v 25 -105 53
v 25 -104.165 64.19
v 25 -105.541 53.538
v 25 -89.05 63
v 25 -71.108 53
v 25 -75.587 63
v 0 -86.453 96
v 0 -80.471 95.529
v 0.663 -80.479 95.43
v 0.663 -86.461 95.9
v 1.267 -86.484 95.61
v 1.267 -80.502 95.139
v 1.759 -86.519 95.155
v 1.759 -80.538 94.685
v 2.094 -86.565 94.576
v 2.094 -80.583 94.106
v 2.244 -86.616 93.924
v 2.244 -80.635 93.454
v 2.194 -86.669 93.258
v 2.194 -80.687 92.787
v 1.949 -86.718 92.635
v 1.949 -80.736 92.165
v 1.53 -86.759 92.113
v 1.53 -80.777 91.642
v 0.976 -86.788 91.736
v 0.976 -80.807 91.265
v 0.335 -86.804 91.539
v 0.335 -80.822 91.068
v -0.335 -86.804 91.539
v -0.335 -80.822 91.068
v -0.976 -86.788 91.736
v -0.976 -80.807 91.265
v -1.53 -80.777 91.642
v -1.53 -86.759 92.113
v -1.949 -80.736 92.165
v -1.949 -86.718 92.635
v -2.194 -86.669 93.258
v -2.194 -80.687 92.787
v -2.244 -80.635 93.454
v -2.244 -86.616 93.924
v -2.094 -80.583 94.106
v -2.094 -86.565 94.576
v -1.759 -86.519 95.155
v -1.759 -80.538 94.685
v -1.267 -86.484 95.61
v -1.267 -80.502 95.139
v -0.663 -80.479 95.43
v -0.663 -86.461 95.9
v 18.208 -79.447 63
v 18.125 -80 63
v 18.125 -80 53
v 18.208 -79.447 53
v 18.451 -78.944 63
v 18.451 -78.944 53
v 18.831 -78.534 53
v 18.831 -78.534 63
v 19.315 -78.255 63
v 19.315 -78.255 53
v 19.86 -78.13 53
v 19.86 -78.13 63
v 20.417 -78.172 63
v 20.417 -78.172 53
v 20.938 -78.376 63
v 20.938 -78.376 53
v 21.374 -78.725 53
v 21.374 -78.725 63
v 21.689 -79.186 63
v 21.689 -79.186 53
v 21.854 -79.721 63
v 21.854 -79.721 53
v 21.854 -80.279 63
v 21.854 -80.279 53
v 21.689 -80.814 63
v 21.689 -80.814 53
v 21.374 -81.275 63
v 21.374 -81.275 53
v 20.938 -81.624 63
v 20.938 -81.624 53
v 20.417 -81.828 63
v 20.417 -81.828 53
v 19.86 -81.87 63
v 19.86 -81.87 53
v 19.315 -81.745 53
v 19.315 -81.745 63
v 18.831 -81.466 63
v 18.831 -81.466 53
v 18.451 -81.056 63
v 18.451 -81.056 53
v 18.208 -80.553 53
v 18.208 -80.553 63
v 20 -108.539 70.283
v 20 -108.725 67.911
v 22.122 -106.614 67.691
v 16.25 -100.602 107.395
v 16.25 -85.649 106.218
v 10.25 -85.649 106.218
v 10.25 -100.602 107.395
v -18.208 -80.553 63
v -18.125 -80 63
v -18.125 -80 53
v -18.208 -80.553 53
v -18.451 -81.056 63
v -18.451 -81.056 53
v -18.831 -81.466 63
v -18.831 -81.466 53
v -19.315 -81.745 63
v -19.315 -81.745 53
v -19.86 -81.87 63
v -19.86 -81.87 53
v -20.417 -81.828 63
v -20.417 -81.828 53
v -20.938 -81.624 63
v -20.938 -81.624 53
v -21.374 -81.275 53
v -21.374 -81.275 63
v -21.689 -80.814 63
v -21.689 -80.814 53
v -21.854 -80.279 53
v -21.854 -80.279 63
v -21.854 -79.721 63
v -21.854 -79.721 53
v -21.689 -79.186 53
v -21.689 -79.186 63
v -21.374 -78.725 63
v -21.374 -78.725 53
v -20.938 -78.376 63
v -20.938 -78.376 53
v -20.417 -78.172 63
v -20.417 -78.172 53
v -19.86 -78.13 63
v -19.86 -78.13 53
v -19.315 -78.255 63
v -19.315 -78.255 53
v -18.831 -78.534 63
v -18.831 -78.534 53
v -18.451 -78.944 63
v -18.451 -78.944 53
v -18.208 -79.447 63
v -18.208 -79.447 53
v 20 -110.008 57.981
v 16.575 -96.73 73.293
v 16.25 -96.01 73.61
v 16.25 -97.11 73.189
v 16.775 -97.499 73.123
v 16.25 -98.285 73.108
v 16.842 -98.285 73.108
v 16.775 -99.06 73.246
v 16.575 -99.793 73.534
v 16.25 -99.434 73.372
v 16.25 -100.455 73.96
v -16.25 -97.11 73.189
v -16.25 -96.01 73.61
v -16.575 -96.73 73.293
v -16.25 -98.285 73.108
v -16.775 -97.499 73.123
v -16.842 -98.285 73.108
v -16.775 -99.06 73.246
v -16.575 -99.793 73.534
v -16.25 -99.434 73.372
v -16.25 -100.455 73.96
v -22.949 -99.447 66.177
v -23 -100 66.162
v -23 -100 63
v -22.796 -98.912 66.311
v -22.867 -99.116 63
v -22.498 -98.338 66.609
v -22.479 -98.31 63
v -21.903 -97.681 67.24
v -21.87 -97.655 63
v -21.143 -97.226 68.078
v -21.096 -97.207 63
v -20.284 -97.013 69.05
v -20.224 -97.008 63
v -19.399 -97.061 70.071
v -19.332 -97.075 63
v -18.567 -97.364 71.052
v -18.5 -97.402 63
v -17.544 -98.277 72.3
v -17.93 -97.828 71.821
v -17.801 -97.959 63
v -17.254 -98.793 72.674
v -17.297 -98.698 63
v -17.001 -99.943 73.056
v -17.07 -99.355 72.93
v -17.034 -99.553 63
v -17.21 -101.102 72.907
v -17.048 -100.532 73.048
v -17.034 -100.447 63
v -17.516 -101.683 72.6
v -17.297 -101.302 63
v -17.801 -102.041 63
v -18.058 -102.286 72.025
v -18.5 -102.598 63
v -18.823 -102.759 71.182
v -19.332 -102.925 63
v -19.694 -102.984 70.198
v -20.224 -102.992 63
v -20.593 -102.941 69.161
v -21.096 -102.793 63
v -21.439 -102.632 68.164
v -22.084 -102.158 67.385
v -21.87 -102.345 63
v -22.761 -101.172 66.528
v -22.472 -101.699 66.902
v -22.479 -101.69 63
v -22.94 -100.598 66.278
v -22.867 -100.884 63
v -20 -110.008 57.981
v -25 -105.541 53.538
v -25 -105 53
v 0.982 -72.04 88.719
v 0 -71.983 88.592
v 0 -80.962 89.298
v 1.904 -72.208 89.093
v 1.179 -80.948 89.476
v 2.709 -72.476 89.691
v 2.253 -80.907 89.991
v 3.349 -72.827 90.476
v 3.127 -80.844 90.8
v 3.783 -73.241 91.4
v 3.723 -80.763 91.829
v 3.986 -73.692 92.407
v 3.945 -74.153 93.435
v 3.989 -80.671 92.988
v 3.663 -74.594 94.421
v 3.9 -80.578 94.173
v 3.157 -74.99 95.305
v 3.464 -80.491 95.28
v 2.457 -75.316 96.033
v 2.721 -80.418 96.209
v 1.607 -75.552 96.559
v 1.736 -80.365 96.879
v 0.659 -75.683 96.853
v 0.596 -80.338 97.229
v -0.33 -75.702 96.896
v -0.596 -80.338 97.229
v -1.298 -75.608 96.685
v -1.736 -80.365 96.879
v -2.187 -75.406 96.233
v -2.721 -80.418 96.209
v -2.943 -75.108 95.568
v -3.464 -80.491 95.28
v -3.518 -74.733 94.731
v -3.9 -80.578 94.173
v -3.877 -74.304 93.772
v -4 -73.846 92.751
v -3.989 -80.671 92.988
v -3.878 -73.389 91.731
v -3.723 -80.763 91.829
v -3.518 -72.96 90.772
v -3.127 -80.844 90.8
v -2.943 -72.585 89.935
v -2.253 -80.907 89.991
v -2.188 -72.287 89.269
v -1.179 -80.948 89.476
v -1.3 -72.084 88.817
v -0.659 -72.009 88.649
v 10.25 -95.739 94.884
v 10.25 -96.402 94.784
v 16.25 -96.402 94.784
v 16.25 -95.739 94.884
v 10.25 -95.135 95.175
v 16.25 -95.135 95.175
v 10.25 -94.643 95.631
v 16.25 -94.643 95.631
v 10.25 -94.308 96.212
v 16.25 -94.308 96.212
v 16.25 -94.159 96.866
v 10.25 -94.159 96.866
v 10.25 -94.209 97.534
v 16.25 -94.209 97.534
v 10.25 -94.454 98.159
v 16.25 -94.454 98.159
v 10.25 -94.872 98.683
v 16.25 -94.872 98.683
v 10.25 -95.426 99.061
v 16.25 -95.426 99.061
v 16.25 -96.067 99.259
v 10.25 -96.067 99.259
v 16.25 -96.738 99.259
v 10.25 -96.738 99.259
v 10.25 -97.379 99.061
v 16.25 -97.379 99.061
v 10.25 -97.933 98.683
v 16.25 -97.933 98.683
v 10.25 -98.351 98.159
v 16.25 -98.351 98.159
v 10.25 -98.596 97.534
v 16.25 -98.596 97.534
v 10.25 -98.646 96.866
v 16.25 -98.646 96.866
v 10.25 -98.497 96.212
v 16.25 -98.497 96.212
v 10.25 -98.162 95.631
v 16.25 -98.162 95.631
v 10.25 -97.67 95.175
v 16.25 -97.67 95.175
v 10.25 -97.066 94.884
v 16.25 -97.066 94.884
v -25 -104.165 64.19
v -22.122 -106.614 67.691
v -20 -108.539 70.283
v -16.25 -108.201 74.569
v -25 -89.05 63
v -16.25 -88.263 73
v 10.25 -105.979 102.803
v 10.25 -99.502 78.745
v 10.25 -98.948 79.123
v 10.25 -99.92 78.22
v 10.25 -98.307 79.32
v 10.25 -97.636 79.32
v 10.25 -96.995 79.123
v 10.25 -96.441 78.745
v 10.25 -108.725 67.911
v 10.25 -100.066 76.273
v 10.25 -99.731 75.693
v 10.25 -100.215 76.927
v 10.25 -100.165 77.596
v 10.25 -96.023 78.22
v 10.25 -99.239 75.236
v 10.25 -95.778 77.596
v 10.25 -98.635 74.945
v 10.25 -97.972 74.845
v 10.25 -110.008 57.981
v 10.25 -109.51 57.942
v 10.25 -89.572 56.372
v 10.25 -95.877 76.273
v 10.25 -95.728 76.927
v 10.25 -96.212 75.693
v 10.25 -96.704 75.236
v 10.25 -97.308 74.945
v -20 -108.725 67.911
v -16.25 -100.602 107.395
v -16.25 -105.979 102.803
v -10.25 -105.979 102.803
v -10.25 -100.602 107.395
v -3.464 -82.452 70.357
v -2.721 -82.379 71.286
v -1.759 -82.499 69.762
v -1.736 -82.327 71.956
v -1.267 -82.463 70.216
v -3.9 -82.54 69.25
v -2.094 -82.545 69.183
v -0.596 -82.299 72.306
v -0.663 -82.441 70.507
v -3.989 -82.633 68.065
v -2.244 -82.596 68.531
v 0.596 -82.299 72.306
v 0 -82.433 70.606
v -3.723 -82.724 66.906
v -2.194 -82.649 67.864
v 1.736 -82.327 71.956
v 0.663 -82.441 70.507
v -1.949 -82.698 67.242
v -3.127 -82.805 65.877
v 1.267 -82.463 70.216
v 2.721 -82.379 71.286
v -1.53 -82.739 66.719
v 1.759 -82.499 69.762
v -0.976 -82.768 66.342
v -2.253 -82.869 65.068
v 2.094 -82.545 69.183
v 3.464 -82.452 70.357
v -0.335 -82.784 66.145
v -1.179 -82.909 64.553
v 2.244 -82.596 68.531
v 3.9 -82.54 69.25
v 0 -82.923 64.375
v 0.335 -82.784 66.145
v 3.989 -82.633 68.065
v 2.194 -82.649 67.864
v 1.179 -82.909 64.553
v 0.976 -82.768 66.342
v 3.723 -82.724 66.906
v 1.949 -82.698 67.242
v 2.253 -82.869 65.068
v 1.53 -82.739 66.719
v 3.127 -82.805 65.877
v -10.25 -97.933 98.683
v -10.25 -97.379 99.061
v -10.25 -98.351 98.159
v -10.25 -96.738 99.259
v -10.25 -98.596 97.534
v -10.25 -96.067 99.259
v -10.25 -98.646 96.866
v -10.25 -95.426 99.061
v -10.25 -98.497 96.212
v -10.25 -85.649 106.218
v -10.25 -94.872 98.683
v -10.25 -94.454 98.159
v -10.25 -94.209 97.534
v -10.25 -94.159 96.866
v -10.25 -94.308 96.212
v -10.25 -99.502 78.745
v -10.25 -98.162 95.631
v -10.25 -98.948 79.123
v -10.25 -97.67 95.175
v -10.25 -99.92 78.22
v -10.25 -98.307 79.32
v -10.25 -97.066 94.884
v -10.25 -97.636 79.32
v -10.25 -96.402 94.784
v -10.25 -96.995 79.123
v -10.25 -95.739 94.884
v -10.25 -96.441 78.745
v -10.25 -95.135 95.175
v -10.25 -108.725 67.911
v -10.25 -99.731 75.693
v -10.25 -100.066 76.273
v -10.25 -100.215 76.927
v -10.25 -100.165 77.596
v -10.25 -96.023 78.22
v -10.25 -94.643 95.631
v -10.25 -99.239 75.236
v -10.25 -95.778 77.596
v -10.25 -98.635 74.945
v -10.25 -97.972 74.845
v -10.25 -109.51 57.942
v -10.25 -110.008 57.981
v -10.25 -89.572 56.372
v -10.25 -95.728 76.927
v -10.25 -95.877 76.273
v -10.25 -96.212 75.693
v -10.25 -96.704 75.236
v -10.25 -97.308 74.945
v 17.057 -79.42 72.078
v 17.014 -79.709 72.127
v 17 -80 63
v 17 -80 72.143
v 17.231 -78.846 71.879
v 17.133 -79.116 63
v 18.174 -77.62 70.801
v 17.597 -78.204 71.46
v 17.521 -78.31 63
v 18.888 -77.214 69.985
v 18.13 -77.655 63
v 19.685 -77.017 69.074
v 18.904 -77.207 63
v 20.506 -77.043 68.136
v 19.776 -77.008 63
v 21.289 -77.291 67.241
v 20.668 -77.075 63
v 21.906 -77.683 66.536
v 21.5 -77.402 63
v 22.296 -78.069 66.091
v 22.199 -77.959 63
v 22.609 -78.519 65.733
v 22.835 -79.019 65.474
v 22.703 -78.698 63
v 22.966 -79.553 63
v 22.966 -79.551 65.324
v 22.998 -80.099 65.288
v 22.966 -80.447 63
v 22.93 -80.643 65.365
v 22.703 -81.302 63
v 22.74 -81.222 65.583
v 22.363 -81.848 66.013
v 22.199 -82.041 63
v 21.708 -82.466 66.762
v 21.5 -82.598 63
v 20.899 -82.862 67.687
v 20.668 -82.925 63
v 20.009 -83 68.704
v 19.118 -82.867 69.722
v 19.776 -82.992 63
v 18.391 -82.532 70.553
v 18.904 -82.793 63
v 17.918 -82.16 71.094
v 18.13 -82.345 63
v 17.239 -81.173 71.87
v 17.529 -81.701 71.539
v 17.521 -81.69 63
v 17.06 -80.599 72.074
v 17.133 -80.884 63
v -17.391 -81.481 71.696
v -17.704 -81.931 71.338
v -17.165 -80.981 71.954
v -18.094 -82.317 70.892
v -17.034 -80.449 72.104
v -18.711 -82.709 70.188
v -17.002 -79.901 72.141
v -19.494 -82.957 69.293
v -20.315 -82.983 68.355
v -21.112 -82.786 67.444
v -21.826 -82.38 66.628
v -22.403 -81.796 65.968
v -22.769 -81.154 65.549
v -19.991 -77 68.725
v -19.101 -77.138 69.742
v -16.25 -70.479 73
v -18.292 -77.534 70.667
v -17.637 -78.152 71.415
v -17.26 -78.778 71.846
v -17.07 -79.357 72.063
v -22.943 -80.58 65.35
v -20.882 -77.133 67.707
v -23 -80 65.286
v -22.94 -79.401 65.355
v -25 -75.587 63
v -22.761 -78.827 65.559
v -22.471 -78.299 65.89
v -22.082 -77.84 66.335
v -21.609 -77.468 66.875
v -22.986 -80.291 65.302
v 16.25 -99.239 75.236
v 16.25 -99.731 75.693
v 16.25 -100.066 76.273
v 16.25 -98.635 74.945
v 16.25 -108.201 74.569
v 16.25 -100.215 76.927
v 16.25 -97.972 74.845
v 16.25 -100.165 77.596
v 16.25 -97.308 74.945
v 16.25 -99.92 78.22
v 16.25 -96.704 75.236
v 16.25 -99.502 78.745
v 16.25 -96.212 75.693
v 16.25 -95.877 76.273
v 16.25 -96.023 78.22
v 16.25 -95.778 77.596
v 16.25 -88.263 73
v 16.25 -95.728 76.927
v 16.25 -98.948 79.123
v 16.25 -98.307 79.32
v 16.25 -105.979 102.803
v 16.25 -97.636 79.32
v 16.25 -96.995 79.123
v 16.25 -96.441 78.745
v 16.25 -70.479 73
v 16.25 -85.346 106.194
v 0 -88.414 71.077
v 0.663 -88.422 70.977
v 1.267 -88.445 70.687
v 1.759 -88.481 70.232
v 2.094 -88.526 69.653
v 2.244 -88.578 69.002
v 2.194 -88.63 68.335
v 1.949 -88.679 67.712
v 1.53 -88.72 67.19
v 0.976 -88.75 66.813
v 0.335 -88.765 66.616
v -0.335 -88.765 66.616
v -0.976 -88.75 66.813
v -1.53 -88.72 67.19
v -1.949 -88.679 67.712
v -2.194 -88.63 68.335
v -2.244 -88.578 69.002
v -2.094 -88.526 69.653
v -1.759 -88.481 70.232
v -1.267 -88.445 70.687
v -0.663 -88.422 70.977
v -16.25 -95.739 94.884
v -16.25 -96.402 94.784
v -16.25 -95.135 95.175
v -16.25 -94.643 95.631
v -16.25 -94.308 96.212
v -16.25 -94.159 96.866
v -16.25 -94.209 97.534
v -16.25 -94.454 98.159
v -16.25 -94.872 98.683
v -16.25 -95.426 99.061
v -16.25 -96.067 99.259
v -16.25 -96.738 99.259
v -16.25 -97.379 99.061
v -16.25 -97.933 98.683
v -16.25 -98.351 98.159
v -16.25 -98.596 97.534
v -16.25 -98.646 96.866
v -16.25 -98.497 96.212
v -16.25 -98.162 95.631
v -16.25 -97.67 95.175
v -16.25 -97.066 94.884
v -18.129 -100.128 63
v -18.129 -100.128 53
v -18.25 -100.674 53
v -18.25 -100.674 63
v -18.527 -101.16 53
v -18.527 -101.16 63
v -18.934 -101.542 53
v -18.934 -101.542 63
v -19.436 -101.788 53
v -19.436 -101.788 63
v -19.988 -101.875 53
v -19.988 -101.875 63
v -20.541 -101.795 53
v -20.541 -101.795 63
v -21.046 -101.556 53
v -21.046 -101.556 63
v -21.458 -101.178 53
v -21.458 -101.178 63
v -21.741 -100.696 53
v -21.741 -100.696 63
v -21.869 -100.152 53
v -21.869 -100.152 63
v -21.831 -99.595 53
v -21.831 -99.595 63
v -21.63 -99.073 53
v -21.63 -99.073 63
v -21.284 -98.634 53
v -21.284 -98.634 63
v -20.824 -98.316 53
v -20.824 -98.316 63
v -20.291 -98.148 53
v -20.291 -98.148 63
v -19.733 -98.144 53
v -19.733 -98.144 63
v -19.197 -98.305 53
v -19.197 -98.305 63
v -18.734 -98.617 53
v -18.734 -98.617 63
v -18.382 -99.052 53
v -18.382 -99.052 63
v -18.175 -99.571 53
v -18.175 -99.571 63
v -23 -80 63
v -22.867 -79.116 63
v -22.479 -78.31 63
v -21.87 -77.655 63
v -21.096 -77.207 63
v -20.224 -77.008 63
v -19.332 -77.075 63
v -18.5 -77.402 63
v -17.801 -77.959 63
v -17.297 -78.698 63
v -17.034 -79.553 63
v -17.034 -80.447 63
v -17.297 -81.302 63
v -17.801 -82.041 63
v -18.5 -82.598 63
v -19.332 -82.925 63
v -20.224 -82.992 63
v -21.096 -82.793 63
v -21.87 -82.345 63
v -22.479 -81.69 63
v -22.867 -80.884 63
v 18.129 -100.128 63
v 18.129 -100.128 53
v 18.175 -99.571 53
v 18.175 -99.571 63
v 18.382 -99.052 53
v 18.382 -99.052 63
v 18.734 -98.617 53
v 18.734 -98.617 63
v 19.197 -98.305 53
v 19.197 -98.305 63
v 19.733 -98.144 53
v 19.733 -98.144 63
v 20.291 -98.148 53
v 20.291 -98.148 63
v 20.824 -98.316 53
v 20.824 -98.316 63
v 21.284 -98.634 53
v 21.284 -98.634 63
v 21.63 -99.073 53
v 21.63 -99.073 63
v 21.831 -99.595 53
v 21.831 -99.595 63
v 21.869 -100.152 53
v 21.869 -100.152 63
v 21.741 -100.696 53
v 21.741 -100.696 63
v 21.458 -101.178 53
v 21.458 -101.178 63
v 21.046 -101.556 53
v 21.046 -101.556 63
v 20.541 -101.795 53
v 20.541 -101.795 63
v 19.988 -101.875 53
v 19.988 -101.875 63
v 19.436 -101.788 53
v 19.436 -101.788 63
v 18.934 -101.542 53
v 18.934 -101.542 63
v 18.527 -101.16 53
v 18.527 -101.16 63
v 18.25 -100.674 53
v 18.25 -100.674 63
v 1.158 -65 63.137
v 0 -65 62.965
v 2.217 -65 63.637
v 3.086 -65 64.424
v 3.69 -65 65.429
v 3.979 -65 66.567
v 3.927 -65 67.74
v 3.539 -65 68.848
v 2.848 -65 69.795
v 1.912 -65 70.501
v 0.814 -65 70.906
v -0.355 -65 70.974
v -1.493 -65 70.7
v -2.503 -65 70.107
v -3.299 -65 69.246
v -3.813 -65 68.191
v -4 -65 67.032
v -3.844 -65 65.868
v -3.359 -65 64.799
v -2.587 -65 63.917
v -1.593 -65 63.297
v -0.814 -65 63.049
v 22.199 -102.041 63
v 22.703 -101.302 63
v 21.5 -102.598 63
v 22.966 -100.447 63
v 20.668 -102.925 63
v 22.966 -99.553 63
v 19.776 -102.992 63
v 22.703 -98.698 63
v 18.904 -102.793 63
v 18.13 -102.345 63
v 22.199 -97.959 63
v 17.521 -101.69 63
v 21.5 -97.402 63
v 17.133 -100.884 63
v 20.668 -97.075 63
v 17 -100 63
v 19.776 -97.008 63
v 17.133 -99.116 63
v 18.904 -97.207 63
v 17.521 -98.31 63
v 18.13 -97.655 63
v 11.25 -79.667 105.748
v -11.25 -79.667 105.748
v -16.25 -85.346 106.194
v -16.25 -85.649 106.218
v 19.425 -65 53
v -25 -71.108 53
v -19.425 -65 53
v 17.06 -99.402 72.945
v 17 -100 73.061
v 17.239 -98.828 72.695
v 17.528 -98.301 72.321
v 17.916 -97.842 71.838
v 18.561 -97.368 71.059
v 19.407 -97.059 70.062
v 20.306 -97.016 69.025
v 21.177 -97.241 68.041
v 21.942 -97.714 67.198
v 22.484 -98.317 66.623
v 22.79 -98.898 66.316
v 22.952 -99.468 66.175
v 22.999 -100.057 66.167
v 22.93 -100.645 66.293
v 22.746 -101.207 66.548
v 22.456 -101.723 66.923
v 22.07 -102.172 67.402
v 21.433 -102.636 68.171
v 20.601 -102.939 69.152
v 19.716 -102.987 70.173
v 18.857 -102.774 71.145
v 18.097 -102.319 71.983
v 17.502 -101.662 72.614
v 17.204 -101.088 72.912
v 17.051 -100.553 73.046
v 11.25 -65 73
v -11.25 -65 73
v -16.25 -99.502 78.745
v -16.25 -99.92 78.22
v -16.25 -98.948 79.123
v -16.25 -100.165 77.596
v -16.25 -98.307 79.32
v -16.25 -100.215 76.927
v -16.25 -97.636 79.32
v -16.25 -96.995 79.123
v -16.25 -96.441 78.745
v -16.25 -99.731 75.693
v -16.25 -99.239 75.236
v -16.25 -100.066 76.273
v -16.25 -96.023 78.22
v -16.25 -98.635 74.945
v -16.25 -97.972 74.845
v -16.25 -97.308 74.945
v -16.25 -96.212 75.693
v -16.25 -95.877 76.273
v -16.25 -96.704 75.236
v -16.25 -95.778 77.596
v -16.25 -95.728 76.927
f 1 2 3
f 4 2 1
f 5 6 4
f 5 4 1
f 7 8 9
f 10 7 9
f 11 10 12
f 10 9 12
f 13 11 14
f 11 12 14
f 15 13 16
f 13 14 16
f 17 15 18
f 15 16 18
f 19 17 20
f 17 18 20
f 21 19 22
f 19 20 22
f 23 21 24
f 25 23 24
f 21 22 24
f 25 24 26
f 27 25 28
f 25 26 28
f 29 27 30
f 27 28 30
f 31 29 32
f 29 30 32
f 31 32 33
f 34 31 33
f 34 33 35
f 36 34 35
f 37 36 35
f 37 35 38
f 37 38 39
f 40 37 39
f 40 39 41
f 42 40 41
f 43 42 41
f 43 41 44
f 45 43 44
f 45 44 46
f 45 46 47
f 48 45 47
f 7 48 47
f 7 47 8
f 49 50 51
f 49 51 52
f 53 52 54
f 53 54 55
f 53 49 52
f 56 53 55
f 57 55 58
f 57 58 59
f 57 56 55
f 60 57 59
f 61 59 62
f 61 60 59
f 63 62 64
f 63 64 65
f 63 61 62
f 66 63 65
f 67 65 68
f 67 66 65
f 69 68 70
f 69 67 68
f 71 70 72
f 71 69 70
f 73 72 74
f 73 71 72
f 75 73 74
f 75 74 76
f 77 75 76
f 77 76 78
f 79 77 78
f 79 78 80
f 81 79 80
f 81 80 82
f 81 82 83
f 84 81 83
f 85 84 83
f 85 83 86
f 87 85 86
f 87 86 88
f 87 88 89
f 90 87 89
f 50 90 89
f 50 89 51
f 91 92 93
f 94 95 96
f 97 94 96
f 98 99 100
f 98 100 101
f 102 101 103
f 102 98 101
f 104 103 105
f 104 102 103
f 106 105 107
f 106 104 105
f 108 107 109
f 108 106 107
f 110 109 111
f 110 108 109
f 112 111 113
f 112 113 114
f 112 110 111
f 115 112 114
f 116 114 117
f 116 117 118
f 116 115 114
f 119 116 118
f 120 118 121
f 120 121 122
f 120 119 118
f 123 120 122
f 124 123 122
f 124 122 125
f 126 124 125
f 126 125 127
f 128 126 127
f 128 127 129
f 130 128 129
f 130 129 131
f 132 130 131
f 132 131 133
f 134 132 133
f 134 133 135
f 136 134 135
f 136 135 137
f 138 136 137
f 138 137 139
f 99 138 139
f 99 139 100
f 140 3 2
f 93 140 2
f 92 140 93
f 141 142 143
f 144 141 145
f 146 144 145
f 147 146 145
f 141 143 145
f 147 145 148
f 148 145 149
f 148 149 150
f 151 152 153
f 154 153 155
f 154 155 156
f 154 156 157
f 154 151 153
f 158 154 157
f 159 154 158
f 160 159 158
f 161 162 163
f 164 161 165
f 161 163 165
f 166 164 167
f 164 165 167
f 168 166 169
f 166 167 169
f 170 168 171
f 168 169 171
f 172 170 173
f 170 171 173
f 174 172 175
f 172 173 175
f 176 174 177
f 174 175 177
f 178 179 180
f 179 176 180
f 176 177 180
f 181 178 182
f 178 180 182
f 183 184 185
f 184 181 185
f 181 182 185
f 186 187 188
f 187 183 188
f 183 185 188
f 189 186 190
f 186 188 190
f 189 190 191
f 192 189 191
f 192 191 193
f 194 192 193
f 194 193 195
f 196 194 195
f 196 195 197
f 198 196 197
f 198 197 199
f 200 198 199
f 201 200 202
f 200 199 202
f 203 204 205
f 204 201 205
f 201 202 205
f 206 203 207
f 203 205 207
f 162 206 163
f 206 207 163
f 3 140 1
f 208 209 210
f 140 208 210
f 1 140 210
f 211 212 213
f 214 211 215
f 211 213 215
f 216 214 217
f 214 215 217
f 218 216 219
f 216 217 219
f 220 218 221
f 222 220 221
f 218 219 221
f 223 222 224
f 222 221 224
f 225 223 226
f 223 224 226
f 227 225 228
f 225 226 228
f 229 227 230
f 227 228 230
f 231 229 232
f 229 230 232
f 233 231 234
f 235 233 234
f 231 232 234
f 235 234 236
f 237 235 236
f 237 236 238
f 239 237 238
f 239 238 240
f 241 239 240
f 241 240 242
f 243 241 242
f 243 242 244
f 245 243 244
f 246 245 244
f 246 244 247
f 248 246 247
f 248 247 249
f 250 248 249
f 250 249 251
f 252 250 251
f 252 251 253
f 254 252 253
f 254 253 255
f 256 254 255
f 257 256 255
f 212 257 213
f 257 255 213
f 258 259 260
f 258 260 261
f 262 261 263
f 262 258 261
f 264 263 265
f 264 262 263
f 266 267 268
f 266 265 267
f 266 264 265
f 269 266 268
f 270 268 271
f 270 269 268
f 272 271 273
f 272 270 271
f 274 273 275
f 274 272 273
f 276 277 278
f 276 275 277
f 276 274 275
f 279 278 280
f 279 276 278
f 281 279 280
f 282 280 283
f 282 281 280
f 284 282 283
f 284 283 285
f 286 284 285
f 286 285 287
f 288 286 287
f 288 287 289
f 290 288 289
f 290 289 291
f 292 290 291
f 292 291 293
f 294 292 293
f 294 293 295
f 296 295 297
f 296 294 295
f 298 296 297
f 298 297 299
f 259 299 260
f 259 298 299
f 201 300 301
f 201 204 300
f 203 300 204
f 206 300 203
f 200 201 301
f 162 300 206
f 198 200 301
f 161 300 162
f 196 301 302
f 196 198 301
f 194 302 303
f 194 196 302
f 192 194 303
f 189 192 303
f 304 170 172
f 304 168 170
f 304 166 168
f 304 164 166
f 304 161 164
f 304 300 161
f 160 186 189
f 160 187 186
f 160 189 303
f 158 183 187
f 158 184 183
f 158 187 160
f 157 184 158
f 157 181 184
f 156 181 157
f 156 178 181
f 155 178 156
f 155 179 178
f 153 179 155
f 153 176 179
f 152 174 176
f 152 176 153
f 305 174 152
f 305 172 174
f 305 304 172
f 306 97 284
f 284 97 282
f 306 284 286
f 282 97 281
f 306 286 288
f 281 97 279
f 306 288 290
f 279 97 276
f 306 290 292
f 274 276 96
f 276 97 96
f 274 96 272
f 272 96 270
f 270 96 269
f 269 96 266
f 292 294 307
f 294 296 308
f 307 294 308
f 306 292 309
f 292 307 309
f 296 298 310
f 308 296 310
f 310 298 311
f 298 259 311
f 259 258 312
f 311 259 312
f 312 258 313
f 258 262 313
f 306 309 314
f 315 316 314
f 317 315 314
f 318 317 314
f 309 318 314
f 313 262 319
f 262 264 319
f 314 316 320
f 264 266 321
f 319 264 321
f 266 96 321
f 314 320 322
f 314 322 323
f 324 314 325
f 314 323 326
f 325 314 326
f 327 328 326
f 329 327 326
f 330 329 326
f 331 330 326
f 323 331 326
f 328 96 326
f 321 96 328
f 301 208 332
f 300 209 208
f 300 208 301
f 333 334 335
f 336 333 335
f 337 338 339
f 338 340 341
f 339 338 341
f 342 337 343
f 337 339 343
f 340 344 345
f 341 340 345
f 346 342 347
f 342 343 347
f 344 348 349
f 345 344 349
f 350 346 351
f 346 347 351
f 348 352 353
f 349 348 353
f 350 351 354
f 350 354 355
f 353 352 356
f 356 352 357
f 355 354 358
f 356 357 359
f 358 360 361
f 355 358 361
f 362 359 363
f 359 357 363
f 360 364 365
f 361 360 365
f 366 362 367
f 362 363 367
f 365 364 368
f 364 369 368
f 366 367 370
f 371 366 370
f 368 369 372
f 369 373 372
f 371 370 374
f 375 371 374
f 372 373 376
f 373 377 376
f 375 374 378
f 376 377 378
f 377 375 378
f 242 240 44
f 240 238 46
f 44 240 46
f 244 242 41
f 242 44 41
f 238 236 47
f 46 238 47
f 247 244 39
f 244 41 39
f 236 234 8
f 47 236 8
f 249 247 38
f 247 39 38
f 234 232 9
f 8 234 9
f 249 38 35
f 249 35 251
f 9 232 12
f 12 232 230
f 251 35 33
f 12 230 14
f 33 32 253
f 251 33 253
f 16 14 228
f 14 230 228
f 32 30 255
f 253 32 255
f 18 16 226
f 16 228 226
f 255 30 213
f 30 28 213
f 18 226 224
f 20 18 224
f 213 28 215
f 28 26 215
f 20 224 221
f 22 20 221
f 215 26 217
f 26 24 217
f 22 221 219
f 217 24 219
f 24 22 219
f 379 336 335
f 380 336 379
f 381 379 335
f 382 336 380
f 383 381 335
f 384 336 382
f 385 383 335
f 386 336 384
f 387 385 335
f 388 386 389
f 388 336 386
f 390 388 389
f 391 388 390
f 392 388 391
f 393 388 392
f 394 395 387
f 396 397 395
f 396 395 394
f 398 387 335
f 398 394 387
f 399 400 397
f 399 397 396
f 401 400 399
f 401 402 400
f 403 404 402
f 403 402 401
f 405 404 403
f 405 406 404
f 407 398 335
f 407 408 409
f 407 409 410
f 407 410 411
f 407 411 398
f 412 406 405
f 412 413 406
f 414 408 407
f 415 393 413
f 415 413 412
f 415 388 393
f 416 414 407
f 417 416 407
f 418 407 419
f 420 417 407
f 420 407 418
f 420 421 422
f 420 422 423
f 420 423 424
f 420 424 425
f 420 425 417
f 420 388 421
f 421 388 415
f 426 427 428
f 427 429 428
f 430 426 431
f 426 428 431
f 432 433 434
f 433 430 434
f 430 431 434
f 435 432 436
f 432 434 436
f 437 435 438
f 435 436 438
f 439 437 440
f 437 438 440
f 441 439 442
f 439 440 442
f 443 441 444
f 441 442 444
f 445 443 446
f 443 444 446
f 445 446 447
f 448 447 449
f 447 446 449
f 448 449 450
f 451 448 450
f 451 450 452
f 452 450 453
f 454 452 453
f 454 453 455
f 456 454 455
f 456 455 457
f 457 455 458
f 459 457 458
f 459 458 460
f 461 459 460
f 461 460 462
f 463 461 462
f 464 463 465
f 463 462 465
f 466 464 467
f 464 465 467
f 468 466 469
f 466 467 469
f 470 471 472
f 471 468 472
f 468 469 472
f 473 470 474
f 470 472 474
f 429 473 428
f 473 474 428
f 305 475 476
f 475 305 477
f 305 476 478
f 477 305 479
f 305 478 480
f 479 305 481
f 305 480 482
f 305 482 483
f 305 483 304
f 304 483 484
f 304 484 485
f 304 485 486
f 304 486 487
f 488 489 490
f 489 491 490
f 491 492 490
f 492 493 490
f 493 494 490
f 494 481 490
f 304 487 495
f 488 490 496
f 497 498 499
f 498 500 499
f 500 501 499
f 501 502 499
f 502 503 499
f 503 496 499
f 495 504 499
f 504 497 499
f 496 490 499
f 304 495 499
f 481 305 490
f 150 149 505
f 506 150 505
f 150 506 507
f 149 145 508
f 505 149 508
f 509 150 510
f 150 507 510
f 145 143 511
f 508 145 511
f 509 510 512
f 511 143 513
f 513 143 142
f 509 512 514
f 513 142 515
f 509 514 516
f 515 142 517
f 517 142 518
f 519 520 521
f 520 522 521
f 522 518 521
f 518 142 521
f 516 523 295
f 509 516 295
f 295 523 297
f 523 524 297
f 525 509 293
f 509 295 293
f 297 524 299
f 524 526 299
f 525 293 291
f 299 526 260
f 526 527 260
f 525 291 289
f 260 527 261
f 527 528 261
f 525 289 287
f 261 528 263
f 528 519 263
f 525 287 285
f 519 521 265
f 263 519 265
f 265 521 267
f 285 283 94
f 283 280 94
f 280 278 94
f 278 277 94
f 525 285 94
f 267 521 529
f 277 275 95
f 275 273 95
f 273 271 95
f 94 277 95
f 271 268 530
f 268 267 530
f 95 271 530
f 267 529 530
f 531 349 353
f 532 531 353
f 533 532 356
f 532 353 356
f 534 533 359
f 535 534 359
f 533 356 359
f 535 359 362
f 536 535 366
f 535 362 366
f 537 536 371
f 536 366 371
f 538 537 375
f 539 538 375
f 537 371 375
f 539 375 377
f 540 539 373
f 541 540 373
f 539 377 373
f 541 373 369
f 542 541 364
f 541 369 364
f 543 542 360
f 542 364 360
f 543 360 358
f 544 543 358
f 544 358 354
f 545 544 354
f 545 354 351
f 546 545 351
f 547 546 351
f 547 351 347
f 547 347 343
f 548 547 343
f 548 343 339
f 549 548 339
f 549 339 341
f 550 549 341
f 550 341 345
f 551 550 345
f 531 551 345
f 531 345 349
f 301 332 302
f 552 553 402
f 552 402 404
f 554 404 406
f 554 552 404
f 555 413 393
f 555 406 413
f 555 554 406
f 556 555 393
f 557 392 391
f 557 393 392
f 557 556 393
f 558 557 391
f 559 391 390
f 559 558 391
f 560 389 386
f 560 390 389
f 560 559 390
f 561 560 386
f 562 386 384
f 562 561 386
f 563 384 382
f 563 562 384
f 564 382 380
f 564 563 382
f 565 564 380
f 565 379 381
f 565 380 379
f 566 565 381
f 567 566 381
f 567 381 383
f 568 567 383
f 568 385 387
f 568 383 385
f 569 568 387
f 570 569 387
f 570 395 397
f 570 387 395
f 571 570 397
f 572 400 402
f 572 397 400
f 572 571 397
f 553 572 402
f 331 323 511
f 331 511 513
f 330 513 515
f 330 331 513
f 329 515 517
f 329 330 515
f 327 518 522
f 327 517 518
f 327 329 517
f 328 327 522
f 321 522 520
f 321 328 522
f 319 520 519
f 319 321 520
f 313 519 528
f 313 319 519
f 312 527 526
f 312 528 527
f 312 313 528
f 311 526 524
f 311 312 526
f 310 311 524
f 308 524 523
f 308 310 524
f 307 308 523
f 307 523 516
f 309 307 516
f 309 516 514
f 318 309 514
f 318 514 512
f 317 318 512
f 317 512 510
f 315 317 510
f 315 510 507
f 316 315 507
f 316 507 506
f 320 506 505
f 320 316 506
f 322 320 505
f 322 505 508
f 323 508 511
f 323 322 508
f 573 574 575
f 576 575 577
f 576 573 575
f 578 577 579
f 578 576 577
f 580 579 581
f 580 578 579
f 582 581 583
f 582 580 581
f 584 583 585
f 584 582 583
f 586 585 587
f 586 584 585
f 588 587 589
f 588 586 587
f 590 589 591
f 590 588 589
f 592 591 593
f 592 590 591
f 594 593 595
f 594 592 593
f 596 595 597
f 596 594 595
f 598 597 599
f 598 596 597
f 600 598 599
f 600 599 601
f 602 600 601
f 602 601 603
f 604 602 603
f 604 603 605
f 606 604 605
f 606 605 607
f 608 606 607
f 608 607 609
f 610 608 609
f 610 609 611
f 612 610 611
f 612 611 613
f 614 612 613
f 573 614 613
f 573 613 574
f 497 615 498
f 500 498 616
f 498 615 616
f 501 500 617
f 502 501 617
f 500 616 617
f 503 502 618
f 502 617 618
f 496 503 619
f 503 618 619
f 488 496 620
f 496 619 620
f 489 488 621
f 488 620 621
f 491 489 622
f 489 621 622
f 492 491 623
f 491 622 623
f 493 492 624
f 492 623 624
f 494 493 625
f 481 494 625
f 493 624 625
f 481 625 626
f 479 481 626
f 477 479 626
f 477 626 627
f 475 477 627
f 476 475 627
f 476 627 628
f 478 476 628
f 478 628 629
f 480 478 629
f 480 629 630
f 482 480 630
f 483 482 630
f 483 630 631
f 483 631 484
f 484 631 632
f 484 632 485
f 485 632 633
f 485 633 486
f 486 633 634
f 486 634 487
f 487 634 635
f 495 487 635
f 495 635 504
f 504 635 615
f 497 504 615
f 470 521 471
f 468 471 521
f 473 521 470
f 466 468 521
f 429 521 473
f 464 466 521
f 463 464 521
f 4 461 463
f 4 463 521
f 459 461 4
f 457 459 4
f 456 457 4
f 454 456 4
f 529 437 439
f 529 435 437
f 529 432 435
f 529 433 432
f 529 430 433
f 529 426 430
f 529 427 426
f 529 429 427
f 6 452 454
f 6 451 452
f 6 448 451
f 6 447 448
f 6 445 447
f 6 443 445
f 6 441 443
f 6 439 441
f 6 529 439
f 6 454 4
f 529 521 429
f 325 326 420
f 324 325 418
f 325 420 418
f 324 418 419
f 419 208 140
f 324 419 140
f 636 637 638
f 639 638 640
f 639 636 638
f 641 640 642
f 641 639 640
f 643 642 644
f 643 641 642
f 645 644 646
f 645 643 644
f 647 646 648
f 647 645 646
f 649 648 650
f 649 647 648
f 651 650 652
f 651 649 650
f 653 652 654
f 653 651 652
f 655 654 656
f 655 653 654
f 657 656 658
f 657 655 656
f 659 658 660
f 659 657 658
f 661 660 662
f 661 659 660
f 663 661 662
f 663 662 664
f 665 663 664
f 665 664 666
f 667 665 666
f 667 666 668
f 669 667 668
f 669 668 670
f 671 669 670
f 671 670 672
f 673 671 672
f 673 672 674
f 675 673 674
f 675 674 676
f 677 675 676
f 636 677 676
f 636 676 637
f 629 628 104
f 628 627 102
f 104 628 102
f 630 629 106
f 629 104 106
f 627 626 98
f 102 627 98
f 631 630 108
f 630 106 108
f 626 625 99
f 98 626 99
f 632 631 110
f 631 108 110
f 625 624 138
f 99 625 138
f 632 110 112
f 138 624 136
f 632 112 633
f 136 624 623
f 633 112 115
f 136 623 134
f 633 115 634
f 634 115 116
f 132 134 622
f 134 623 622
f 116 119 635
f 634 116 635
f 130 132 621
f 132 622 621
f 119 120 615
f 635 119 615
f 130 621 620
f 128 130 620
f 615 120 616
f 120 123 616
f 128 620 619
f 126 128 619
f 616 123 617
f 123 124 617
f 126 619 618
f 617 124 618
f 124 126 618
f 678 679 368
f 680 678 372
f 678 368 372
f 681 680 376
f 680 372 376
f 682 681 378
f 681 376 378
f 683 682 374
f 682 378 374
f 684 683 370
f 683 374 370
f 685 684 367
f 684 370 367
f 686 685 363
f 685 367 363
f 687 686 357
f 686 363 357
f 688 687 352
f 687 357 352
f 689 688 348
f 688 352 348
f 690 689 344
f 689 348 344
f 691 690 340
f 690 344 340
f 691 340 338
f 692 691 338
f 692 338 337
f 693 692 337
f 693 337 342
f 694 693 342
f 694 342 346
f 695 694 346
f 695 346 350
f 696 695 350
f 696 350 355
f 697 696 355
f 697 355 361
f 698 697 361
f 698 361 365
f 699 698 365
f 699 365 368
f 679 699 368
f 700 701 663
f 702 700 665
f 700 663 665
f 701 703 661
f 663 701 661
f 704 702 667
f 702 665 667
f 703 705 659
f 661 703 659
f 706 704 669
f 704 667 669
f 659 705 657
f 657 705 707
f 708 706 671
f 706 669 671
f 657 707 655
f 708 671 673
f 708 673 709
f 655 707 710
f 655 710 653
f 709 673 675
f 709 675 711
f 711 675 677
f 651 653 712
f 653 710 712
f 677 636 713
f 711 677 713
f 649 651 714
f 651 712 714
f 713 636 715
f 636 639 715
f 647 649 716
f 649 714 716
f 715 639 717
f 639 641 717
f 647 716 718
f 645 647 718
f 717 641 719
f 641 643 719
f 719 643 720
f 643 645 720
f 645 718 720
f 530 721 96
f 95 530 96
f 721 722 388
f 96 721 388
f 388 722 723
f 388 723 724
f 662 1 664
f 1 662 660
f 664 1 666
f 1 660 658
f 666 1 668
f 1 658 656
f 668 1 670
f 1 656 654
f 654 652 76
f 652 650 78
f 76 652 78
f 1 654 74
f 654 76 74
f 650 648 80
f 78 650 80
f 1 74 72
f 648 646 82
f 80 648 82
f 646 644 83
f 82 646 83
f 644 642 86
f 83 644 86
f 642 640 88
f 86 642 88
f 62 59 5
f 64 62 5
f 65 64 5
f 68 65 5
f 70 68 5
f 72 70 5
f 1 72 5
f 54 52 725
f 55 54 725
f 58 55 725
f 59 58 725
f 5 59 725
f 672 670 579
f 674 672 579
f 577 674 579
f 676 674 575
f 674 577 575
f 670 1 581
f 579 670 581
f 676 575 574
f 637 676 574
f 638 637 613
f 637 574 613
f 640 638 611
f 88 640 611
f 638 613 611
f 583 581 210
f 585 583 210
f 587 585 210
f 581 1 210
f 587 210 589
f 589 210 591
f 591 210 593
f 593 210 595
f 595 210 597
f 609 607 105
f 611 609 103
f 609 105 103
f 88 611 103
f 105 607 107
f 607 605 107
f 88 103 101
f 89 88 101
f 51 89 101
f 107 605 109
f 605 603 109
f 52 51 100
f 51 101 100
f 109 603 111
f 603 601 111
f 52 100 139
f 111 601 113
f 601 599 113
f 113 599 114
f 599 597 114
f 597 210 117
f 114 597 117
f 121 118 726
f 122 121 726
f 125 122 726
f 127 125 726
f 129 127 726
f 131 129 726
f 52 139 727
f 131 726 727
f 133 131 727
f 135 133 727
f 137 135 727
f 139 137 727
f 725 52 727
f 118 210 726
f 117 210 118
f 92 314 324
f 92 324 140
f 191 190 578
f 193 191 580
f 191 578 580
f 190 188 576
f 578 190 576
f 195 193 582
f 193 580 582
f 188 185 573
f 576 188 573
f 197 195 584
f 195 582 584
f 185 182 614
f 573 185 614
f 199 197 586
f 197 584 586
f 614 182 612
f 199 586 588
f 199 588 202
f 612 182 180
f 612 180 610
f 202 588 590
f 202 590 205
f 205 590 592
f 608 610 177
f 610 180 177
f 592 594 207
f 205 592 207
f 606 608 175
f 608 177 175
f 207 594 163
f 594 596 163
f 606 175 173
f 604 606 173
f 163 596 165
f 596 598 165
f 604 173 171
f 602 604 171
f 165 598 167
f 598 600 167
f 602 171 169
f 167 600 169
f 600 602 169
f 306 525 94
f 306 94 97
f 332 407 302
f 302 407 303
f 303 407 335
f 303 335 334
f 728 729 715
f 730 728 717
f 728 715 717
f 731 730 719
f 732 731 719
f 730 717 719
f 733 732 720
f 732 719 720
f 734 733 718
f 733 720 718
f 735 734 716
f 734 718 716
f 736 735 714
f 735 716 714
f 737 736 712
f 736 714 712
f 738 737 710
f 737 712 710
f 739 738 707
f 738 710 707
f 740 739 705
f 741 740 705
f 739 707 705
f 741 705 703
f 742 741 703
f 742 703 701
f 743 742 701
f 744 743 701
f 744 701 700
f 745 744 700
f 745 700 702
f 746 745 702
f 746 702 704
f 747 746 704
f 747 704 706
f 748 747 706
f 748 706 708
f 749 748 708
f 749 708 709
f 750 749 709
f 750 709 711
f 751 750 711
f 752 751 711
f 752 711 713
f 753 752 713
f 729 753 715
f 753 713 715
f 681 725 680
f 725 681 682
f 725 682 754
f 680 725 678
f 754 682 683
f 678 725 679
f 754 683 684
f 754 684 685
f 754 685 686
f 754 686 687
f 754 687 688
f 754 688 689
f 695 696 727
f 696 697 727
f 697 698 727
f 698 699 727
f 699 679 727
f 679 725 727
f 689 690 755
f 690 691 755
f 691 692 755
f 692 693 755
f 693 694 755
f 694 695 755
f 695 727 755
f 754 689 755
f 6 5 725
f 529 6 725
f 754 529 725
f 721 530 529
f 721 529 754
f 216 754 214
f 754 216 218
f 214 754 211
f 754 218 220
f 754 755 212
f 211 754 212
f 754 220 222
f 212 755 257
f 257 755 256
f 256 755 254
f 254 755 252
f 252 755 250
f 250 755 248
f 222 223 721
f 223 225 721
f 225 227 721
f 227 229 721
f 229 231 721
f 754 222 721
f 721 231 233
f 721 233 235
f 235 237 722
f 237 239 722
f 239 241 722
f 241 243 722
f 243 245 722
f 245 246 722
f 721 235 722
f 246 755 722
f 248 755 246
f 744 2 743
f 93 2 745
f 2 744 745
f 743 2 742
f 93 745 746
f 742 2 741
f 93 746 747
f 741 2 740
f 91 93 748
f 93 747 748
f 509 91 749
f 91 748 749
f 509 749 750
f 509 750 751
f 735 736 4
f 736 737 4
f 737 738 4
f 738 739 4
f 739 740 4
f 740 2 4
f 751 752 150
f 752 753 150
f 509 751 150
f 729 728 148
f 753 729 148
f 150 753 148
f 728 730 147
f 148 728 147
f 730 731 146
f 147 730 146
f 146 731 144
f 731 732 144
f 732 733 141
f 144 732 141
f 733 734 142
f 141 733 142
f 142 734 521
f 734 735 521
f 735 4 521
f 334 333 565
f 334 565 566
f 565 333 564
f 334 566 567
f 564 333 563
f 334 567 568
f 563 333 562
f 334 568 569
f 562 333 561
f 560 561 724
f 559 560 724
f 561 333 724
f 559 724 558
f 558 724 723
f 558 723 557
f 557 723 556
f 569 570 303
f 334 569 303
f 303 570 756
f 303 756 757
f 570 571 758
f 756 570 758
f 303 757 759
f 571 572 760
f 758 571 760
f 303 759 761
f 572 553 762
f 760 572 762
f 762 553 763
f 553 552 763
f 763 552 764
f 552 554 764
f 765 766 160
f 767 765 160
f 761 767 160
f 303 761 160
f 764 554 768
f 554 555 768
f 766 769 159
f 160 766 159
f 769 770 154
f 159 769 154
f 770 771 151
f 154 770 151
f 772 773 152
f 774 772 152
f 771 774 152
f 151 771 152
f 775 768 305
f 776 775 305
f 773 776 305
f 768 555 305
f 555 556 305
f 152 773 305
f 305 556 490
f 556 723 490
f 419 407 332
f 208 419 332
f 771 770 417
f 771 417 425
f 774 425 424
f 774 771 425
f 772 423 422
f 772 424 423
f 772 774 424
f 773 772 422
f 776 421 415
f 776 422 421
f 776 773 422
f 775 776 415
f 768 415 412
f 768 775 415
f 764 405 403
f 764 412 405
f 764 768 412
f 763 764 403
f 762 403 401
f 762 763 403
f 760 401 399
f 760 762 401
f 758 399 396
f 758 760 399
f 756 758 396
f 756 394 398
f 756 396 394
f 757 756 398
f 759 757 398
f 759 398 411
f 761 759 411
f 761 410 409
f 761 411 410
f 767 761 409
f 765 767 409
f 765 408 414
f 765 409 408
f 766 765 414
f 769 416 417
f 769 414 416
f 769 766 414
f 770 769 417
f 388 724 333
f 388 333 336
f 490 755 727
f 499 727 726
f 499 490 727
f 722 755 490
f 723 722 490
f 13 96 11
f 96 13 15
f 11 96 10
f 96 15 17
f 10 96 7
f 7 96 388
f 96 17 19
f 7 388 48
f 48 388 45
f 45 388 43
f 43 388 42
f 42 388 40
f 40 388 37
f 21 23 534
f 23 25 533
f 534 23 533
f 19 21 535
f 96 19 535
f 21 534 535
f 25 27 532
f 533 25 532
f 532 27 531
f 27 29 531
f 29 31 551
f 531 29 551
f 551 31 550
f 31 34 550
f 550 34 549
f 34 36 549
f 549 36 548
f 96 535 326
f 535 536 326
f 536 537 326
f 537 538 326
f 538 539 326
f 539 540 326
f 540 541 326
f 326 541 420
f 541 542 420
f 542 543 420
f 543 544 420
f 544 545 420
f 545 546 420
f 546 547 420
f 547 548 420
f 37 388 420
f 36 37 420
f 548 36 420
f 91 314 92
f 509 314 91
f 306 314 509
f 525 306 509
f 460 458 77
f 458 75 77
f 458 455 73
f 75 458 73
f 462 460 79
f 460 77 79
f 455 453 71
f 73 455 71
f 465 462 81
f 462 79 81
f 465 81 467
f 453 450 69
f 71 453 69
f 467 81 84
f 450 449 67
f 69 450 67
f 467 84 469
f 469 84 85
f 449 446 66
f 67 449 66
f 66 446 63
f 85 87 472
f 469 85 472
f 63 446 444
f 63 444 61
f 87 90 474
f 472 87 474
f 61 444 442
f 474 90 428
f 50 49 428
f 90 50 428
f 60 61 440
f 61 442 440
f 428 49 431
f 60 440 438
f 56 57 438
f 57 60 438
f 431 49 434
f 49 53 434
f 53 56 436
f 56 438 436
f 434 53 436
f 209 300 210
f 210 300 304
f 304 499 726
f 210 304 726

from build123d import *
from OCP.BRepFilletAPI import BRepFilletAPI_MakeChamfer

# Parameters (mm, degrees)
BOSS_EXTRUDE1_DEPTH      = 25
BOSS_EXTRUDE1_DEPTH_BACK = 25
CUT_EXTRUDE1_DEPTH       = 25
BOSS_EXTRUDE3_DEPTH      = 20
CHAMFER2_SIZE            = 10
CHAMFER2_SIZE_2          = 0.5
SKETCH5_R                = 4
CUT_EXTRUDE4_DEPTH       = 20
SKETCH6_R                = 2.25
CUT_EXTRUDE5_DEPTH       = 20
CUT_EXTRUDE6_DEPTH       = 30
CUT_EXTRUDE6_DEPTH_BACK  = 20
SKETCH7_R                = 2.25
SKETCH8_R                = 4
CUT_EXTRUDE7_DEPTH       = 20
CUT_EXTRUDE10_DEPTH      = 10
CUT_EXTRUDE10_DEPTH_BACK = 10
SKETCH10_R               = 1.875
SKETCH10_9_R             = 3
SKETCH10_9_R_2           = 1.875
CUT_EXTRUDE11_DEPTH      = 20
CHAMFER3_START           = -141.531055451
CHAMFER3_DEPTH           = 67.531055451
CHAMFER4_SIZE            = 5
CHAMFER5_START           = 49.569652266
CHAMFER5_DEPTH           = 20.503333196
CHAMFER5_START_2         = -70.072985462
CHAMFER5_2_DEPTH         = 20.503333196


with BuildPart() as part:
    # Sketch1 → Boss-Extrude1 (new, two sides: drawn at the far end of the back side and taken through both)
    with BuildSketch(Plane(origin=(0, 0, 0), x_dir=(0, 0, -1), z_dir=(1, 0, 0)).offset(-BOSS_EXTRUDE1_DEPTH_BACK)):
        Polygon((-106.218311965, -85.648642757), (-56.372445278, -89.571597544), (-57.980856741, -110.008402885), (-53, -105), (-53, -65), (-73, -65), (-105.747557391, -79.667138755), align=None)
    extrude(amount=BOSS_EXTRUDE1_DEPTH + BOSS_EXTRUDE1_DEPTH_BACK)

    # Sketch2 → Cut-Extrude1 (cut)
    with BuildSketch(Plane(origin=(0, -65, 0), x_dir=(1, 0, 0), z_dir=(0, 1, 0))):
        Polygon((16.25, -106.218311965), (16.25, -73), (25, -63), (25, -106.218311965), align=None)
        Polygon((-25, -106.218311965), (-16.25, -106.218311965), (-16.25, -73), (-25, -63), align=None)
    extrude(amount=-CUT_EXTRUDE1_DEPTH, mode=Mode.SUBTRACT)

    # Sketch3 → Boss-Extrude3 (add)
    with BuildSketch(Plane(origin=(0, -93.429506703, 7.353061645), x_dir=(1, 0, 0), z_dir=(0, -0.9969173337331282, 0.07845909572784136))):
        Polygon((10.25, 99.170961297), (10.25, 49.170961297), (25, 49.170961297), (25, 55.819009733), (16.25, 65.849931718), (16.25, 99.170961297), align=None)
        Polygon((-10.25, 99.170961297), (-10.25, 49.170961297), (-25, 49.170961297), (-25, 55.819009733), (-16.25, 65.849931718), (-16.25, 99.170961297), align=None)
    extrude(amount=BOSS_EXTRUDE3_DEPTH)

    # Chamfer2
    chamfer2_edges_1 = [part.edges().sort_by_distance(p)[0] for p in [
        (17.625, -109.509944218, 57.941627193),
    ]]
    chamfer2_side_1 = [part.faces().sort_by_distance(p)[0] for p in [
        (17.625, -109.509159627, 57.951596366),
    ]]
    chamfer2_edges_2 = [part.edges().sort_by_distance(p)[0] for p in [
        (-17.625, -109.509944218, 57.941627193),
    ]]
    chamfer2_side_2 = [part.faces().sort_by_distance(p)[0] for p in [
        (-17.625, -109.509159627, 57.951596366),
    ]]
    chamfer2 = BRepFilletAPI_MakeChamfer(part.part.solid().wrapped)
    for e in chamfer2_edges_1:
        chamfer2.Add(CHAMFER2_SIZE - 0.0001, CHAMFER2_SIZE_2 - 0.0001, e.wrapped, chamfer2_side_1[0].wrapped)
    for e in chamfer2_edges_2:
        chamfer2.Add(CHAMFER2_SIZE - 0.0001, CHAMFER2_SIZE_2 - 0.0001, e.wrapped, chamfer2_side_2[0].wrapped)
    add(Compound.cast(chamfer2.Shape()), mode=Mode.REPLACE)  # a hair under: the kernel refuses the full size

    # Sketch5 → Cut-Extrude4 (cut)
    with BuildSketch(Plane(origin=(0, -87.448002701, 6.882307071), x_dir=(-1, 0, 0), z_dir=(0, -0.9969173337331282, 0.07845909572784136))):
        with Locations(Location((0, -61.670961297, 0), (0, 0, 90))):
            Circle(SKETCH5_R)
        with Locations(Location((0, -86.670961297, 0), (0, 0, 90))):
            Circle(SKETCH5_R)
    extrude(amount=-CUT_EXTRUDE4_DEPTH, mode=Mode.SUBTRACT)

    # Sketch6 → Cut-Extrude5 (cut)
    with BuildSketch(Plane(origin=(0, -87.448002701, 6.882307071), x_dir=(1, 0, 0), z_dir=(0, 0.9969173337331282, -0.07845909572784135))):
        with Locations(Location((0, -61.670961297, 0), (0, 0, 270))):
            Circle(SKETCH6_R)
        with Locations(Location((0, -86.670961297, 0), (0, 0, 270))):
            Circle(SKETCH6_R)
    extrude(amount=-CUT_EXTRUDE5_DEPTH, mode=Mode.SUBTRACT)

    # Sketch7 → Cut-Extrude6 (cut, two sides: drawn at the far end of the back side and taken through both)
    with BuildSketch(Plane(origin=(-10.25, 0, 0), x_dir=(0, 0, -1), z_dir=(1, 0, 0)).offset(-CUT_EXTRUDE6_DEPTH_BACK)):
        with Locations((-97.033729585, -96.402407052)):
            Circle(SKETCH7_R)
        with Locations((-77.09538291, -97.971588966)):
            Circle(SKETCH7_R)
    extrude(amount=CUT_EXTRUDE6_DEPTH + CUT_EXTRUDE6_DEPTH_BACK, mode=Mode.SUBTRACT)

    # Sketch8 → Cut-Extrude7 (cut)
    with BuildSketch(Plane.ZY.offset(16.25)):
        with Locations((77.09538291, -97.971588966)):
            Circle(SKETCH8_R)
    cut_extrude7 = extrude(amount=CUT_EXTRUDE7_DEPTH, mode=Mode.SUBTRACT)

    # Mirror1: Cut-Extrude7 across plane
    add(cut_extrude7.mirror(Plane.ZY), mode=Mode.SUBTRACT)

    # Sketch10 → Cut-Extrude10 (cut, two sides: drawn at the far end of the back side and taken through both)
    with BuildSketch(Plane(origin=(0, 0, 63), x_dir=(-1, 0, 0), z_dir=(0, 0, -1)).offset(-CUT_EXTRUDE10_DEPTH_BACK)):
        with Locations(Location((-20, -100, 0), (0, 0, 356.084777763))):
            Circle(SKETCH10_R)
        with Locations((-20, -80)):
            Circle(SKETCH10_R)
        with Locations(Location((20, -80, 0), (0, 0, 180))):
            Circle(SKETCH10_R)
        with Locations(Location((20, -100, 0), (0, 0, 183.915222237))):
            Circle(SKETCH10_R)
    extrude(amount=CUT_EXTRUDE10_DEPTH + CUT_EXTRUDE10_DEPTH_BACK, mode=Mode.SUBTRACT)

    # Sketch10<9> → Cut-Extrude11 (cut)
    # profile 1 of 4: a face of its own
    with BuildSketch(Plane(origin=(0, 0, 63), x_dir=(-1, 0, 0), z_dir=(0, 0, -1))):
        with Locations((20, -100)):
            Circle(SKETCH10_9_R)
        with Locations((20, -100)):
            Circle(SKETCH10_9_R_2, mode=Mode.SUBTRACT)
    # profile 2 of 4: a face of its own
    with BuildSketch(Plane(origin=(0, 0, 63), x_dir=(-1, 0, 0), z_dir=(0, 0, -1))):
        with Locations((20, -80)):
            Circle(SKETCH10_9_R)
        with Locations((20, -80)):
            Circle(SKETCH10_9_R_2, mode=Mode.SUBTRACT)
    # profile 3 of 4: a face of its own
    with BuildSketch(Plane(origin=(0, 0, 63), x_dir=(-1, 0, 0), z_dir=(0, 0, -1))):
        with Locations((-20, -80)):
            Circle(SKETCH10_9_R)
        with Locations((-20, -80)):
            Circle(SKETCH10_9_R_2, mode=Mode.SUBTRACT)
    # profile 4 of 4: a face of its own
    with BuildSketch(Plane(origin=(0, 0, 63), x_dir=(-1, 0, 0), z_dir=(0, 0, -1))):
        with Locations((-20, -100)):
            Circle(SKETCH10_9_R)
        with Locations((-20, -100)):
            Circle(SKETCH10_9_R_2, mode=Mode.SUBTRACT)
    extrude(amount=-CUT_EXTRUDE11_DEPTH, mode=Mode.SUBTRACT)

    # Chamfer3: read off the stored shape, not the designer's step
    # Chamfer3 outline → Chamfer3 (cut)
    with BuildSketch(Plane(origin=(0, 0, 0), x_dir=(1, 0, 0), z_dir=(0, 0.4087588305450842, -0.9126424373495983)).offset(CHAMFER3_START)):
        Polygon((-25, 43.232363798), (-25, 28), (-9.767636202, 28), align=None)
        Polygon((9.767636202, 28), (25, 28), (25, 43.232363798), align=None)
    extrude(amount=CHAMFER3_DEPTH, mode=Mode.SUBTRACT)

    # Chamfer4
    chamfer4_edges = [part.edges().sort_by_distance(p)[0] for p in [
        (-13.25, -105.586989432, 107.78749388),
        (13.25, -105.586989432, 107.78749388),
    ]]
    chamfer(chamfer4_edges, length=CHAMFER4_SIZE)

    # Chamfer5: read off the stored shape, not the designer's step
    # Chamfer5 outline → Chamfer5 (cut)
    with BuildSketch(Plane(origin=(0, 0, 0), x_dir=(0.7072170856964756, 0.7032116882513418, -0.0730569312637863), z_dir=(0.7069964594670781, -0.7034311334001396, 0.07307972950423045)).offset(CHAMFER5_START)):
        Polygon((-95.809344587, 42.345340215), (-95.562635623, 56.312202838), (-95.604662607, 58.691464219), (-95.627776424, 60), (-100, 60), (-100, 41), (-95.833108513, 41), align=None)
    extrude(amount=CHAMFER5_DEPTH, mode=Mode.SUBTRACT)

    # Chamfer5 2 outline → Chamfer5 2 (cut)
    with BuildSketch(Plane(origin=(0, 0, 0), x_dir=(0.7072170856964753, -0.7032116882513376, 0.0730569312638283), z_dir=(0.7069964594670783, 0.7034311334001349, -0.0730797295042724)).offset(CHAMFER5_START_2)):
        Polygon((95.809344587, -42.345340215), (95.562635623, -56.312202838), (95.604662607, -58.691464219), (95.627776424, -60), (100, -60), (100, -41), (95.833108513, -41), align=None)
    extrude(amount=CHAMFER5_2_DEPTH, mode=Mode.SUBTRACT)


solid = part.part
